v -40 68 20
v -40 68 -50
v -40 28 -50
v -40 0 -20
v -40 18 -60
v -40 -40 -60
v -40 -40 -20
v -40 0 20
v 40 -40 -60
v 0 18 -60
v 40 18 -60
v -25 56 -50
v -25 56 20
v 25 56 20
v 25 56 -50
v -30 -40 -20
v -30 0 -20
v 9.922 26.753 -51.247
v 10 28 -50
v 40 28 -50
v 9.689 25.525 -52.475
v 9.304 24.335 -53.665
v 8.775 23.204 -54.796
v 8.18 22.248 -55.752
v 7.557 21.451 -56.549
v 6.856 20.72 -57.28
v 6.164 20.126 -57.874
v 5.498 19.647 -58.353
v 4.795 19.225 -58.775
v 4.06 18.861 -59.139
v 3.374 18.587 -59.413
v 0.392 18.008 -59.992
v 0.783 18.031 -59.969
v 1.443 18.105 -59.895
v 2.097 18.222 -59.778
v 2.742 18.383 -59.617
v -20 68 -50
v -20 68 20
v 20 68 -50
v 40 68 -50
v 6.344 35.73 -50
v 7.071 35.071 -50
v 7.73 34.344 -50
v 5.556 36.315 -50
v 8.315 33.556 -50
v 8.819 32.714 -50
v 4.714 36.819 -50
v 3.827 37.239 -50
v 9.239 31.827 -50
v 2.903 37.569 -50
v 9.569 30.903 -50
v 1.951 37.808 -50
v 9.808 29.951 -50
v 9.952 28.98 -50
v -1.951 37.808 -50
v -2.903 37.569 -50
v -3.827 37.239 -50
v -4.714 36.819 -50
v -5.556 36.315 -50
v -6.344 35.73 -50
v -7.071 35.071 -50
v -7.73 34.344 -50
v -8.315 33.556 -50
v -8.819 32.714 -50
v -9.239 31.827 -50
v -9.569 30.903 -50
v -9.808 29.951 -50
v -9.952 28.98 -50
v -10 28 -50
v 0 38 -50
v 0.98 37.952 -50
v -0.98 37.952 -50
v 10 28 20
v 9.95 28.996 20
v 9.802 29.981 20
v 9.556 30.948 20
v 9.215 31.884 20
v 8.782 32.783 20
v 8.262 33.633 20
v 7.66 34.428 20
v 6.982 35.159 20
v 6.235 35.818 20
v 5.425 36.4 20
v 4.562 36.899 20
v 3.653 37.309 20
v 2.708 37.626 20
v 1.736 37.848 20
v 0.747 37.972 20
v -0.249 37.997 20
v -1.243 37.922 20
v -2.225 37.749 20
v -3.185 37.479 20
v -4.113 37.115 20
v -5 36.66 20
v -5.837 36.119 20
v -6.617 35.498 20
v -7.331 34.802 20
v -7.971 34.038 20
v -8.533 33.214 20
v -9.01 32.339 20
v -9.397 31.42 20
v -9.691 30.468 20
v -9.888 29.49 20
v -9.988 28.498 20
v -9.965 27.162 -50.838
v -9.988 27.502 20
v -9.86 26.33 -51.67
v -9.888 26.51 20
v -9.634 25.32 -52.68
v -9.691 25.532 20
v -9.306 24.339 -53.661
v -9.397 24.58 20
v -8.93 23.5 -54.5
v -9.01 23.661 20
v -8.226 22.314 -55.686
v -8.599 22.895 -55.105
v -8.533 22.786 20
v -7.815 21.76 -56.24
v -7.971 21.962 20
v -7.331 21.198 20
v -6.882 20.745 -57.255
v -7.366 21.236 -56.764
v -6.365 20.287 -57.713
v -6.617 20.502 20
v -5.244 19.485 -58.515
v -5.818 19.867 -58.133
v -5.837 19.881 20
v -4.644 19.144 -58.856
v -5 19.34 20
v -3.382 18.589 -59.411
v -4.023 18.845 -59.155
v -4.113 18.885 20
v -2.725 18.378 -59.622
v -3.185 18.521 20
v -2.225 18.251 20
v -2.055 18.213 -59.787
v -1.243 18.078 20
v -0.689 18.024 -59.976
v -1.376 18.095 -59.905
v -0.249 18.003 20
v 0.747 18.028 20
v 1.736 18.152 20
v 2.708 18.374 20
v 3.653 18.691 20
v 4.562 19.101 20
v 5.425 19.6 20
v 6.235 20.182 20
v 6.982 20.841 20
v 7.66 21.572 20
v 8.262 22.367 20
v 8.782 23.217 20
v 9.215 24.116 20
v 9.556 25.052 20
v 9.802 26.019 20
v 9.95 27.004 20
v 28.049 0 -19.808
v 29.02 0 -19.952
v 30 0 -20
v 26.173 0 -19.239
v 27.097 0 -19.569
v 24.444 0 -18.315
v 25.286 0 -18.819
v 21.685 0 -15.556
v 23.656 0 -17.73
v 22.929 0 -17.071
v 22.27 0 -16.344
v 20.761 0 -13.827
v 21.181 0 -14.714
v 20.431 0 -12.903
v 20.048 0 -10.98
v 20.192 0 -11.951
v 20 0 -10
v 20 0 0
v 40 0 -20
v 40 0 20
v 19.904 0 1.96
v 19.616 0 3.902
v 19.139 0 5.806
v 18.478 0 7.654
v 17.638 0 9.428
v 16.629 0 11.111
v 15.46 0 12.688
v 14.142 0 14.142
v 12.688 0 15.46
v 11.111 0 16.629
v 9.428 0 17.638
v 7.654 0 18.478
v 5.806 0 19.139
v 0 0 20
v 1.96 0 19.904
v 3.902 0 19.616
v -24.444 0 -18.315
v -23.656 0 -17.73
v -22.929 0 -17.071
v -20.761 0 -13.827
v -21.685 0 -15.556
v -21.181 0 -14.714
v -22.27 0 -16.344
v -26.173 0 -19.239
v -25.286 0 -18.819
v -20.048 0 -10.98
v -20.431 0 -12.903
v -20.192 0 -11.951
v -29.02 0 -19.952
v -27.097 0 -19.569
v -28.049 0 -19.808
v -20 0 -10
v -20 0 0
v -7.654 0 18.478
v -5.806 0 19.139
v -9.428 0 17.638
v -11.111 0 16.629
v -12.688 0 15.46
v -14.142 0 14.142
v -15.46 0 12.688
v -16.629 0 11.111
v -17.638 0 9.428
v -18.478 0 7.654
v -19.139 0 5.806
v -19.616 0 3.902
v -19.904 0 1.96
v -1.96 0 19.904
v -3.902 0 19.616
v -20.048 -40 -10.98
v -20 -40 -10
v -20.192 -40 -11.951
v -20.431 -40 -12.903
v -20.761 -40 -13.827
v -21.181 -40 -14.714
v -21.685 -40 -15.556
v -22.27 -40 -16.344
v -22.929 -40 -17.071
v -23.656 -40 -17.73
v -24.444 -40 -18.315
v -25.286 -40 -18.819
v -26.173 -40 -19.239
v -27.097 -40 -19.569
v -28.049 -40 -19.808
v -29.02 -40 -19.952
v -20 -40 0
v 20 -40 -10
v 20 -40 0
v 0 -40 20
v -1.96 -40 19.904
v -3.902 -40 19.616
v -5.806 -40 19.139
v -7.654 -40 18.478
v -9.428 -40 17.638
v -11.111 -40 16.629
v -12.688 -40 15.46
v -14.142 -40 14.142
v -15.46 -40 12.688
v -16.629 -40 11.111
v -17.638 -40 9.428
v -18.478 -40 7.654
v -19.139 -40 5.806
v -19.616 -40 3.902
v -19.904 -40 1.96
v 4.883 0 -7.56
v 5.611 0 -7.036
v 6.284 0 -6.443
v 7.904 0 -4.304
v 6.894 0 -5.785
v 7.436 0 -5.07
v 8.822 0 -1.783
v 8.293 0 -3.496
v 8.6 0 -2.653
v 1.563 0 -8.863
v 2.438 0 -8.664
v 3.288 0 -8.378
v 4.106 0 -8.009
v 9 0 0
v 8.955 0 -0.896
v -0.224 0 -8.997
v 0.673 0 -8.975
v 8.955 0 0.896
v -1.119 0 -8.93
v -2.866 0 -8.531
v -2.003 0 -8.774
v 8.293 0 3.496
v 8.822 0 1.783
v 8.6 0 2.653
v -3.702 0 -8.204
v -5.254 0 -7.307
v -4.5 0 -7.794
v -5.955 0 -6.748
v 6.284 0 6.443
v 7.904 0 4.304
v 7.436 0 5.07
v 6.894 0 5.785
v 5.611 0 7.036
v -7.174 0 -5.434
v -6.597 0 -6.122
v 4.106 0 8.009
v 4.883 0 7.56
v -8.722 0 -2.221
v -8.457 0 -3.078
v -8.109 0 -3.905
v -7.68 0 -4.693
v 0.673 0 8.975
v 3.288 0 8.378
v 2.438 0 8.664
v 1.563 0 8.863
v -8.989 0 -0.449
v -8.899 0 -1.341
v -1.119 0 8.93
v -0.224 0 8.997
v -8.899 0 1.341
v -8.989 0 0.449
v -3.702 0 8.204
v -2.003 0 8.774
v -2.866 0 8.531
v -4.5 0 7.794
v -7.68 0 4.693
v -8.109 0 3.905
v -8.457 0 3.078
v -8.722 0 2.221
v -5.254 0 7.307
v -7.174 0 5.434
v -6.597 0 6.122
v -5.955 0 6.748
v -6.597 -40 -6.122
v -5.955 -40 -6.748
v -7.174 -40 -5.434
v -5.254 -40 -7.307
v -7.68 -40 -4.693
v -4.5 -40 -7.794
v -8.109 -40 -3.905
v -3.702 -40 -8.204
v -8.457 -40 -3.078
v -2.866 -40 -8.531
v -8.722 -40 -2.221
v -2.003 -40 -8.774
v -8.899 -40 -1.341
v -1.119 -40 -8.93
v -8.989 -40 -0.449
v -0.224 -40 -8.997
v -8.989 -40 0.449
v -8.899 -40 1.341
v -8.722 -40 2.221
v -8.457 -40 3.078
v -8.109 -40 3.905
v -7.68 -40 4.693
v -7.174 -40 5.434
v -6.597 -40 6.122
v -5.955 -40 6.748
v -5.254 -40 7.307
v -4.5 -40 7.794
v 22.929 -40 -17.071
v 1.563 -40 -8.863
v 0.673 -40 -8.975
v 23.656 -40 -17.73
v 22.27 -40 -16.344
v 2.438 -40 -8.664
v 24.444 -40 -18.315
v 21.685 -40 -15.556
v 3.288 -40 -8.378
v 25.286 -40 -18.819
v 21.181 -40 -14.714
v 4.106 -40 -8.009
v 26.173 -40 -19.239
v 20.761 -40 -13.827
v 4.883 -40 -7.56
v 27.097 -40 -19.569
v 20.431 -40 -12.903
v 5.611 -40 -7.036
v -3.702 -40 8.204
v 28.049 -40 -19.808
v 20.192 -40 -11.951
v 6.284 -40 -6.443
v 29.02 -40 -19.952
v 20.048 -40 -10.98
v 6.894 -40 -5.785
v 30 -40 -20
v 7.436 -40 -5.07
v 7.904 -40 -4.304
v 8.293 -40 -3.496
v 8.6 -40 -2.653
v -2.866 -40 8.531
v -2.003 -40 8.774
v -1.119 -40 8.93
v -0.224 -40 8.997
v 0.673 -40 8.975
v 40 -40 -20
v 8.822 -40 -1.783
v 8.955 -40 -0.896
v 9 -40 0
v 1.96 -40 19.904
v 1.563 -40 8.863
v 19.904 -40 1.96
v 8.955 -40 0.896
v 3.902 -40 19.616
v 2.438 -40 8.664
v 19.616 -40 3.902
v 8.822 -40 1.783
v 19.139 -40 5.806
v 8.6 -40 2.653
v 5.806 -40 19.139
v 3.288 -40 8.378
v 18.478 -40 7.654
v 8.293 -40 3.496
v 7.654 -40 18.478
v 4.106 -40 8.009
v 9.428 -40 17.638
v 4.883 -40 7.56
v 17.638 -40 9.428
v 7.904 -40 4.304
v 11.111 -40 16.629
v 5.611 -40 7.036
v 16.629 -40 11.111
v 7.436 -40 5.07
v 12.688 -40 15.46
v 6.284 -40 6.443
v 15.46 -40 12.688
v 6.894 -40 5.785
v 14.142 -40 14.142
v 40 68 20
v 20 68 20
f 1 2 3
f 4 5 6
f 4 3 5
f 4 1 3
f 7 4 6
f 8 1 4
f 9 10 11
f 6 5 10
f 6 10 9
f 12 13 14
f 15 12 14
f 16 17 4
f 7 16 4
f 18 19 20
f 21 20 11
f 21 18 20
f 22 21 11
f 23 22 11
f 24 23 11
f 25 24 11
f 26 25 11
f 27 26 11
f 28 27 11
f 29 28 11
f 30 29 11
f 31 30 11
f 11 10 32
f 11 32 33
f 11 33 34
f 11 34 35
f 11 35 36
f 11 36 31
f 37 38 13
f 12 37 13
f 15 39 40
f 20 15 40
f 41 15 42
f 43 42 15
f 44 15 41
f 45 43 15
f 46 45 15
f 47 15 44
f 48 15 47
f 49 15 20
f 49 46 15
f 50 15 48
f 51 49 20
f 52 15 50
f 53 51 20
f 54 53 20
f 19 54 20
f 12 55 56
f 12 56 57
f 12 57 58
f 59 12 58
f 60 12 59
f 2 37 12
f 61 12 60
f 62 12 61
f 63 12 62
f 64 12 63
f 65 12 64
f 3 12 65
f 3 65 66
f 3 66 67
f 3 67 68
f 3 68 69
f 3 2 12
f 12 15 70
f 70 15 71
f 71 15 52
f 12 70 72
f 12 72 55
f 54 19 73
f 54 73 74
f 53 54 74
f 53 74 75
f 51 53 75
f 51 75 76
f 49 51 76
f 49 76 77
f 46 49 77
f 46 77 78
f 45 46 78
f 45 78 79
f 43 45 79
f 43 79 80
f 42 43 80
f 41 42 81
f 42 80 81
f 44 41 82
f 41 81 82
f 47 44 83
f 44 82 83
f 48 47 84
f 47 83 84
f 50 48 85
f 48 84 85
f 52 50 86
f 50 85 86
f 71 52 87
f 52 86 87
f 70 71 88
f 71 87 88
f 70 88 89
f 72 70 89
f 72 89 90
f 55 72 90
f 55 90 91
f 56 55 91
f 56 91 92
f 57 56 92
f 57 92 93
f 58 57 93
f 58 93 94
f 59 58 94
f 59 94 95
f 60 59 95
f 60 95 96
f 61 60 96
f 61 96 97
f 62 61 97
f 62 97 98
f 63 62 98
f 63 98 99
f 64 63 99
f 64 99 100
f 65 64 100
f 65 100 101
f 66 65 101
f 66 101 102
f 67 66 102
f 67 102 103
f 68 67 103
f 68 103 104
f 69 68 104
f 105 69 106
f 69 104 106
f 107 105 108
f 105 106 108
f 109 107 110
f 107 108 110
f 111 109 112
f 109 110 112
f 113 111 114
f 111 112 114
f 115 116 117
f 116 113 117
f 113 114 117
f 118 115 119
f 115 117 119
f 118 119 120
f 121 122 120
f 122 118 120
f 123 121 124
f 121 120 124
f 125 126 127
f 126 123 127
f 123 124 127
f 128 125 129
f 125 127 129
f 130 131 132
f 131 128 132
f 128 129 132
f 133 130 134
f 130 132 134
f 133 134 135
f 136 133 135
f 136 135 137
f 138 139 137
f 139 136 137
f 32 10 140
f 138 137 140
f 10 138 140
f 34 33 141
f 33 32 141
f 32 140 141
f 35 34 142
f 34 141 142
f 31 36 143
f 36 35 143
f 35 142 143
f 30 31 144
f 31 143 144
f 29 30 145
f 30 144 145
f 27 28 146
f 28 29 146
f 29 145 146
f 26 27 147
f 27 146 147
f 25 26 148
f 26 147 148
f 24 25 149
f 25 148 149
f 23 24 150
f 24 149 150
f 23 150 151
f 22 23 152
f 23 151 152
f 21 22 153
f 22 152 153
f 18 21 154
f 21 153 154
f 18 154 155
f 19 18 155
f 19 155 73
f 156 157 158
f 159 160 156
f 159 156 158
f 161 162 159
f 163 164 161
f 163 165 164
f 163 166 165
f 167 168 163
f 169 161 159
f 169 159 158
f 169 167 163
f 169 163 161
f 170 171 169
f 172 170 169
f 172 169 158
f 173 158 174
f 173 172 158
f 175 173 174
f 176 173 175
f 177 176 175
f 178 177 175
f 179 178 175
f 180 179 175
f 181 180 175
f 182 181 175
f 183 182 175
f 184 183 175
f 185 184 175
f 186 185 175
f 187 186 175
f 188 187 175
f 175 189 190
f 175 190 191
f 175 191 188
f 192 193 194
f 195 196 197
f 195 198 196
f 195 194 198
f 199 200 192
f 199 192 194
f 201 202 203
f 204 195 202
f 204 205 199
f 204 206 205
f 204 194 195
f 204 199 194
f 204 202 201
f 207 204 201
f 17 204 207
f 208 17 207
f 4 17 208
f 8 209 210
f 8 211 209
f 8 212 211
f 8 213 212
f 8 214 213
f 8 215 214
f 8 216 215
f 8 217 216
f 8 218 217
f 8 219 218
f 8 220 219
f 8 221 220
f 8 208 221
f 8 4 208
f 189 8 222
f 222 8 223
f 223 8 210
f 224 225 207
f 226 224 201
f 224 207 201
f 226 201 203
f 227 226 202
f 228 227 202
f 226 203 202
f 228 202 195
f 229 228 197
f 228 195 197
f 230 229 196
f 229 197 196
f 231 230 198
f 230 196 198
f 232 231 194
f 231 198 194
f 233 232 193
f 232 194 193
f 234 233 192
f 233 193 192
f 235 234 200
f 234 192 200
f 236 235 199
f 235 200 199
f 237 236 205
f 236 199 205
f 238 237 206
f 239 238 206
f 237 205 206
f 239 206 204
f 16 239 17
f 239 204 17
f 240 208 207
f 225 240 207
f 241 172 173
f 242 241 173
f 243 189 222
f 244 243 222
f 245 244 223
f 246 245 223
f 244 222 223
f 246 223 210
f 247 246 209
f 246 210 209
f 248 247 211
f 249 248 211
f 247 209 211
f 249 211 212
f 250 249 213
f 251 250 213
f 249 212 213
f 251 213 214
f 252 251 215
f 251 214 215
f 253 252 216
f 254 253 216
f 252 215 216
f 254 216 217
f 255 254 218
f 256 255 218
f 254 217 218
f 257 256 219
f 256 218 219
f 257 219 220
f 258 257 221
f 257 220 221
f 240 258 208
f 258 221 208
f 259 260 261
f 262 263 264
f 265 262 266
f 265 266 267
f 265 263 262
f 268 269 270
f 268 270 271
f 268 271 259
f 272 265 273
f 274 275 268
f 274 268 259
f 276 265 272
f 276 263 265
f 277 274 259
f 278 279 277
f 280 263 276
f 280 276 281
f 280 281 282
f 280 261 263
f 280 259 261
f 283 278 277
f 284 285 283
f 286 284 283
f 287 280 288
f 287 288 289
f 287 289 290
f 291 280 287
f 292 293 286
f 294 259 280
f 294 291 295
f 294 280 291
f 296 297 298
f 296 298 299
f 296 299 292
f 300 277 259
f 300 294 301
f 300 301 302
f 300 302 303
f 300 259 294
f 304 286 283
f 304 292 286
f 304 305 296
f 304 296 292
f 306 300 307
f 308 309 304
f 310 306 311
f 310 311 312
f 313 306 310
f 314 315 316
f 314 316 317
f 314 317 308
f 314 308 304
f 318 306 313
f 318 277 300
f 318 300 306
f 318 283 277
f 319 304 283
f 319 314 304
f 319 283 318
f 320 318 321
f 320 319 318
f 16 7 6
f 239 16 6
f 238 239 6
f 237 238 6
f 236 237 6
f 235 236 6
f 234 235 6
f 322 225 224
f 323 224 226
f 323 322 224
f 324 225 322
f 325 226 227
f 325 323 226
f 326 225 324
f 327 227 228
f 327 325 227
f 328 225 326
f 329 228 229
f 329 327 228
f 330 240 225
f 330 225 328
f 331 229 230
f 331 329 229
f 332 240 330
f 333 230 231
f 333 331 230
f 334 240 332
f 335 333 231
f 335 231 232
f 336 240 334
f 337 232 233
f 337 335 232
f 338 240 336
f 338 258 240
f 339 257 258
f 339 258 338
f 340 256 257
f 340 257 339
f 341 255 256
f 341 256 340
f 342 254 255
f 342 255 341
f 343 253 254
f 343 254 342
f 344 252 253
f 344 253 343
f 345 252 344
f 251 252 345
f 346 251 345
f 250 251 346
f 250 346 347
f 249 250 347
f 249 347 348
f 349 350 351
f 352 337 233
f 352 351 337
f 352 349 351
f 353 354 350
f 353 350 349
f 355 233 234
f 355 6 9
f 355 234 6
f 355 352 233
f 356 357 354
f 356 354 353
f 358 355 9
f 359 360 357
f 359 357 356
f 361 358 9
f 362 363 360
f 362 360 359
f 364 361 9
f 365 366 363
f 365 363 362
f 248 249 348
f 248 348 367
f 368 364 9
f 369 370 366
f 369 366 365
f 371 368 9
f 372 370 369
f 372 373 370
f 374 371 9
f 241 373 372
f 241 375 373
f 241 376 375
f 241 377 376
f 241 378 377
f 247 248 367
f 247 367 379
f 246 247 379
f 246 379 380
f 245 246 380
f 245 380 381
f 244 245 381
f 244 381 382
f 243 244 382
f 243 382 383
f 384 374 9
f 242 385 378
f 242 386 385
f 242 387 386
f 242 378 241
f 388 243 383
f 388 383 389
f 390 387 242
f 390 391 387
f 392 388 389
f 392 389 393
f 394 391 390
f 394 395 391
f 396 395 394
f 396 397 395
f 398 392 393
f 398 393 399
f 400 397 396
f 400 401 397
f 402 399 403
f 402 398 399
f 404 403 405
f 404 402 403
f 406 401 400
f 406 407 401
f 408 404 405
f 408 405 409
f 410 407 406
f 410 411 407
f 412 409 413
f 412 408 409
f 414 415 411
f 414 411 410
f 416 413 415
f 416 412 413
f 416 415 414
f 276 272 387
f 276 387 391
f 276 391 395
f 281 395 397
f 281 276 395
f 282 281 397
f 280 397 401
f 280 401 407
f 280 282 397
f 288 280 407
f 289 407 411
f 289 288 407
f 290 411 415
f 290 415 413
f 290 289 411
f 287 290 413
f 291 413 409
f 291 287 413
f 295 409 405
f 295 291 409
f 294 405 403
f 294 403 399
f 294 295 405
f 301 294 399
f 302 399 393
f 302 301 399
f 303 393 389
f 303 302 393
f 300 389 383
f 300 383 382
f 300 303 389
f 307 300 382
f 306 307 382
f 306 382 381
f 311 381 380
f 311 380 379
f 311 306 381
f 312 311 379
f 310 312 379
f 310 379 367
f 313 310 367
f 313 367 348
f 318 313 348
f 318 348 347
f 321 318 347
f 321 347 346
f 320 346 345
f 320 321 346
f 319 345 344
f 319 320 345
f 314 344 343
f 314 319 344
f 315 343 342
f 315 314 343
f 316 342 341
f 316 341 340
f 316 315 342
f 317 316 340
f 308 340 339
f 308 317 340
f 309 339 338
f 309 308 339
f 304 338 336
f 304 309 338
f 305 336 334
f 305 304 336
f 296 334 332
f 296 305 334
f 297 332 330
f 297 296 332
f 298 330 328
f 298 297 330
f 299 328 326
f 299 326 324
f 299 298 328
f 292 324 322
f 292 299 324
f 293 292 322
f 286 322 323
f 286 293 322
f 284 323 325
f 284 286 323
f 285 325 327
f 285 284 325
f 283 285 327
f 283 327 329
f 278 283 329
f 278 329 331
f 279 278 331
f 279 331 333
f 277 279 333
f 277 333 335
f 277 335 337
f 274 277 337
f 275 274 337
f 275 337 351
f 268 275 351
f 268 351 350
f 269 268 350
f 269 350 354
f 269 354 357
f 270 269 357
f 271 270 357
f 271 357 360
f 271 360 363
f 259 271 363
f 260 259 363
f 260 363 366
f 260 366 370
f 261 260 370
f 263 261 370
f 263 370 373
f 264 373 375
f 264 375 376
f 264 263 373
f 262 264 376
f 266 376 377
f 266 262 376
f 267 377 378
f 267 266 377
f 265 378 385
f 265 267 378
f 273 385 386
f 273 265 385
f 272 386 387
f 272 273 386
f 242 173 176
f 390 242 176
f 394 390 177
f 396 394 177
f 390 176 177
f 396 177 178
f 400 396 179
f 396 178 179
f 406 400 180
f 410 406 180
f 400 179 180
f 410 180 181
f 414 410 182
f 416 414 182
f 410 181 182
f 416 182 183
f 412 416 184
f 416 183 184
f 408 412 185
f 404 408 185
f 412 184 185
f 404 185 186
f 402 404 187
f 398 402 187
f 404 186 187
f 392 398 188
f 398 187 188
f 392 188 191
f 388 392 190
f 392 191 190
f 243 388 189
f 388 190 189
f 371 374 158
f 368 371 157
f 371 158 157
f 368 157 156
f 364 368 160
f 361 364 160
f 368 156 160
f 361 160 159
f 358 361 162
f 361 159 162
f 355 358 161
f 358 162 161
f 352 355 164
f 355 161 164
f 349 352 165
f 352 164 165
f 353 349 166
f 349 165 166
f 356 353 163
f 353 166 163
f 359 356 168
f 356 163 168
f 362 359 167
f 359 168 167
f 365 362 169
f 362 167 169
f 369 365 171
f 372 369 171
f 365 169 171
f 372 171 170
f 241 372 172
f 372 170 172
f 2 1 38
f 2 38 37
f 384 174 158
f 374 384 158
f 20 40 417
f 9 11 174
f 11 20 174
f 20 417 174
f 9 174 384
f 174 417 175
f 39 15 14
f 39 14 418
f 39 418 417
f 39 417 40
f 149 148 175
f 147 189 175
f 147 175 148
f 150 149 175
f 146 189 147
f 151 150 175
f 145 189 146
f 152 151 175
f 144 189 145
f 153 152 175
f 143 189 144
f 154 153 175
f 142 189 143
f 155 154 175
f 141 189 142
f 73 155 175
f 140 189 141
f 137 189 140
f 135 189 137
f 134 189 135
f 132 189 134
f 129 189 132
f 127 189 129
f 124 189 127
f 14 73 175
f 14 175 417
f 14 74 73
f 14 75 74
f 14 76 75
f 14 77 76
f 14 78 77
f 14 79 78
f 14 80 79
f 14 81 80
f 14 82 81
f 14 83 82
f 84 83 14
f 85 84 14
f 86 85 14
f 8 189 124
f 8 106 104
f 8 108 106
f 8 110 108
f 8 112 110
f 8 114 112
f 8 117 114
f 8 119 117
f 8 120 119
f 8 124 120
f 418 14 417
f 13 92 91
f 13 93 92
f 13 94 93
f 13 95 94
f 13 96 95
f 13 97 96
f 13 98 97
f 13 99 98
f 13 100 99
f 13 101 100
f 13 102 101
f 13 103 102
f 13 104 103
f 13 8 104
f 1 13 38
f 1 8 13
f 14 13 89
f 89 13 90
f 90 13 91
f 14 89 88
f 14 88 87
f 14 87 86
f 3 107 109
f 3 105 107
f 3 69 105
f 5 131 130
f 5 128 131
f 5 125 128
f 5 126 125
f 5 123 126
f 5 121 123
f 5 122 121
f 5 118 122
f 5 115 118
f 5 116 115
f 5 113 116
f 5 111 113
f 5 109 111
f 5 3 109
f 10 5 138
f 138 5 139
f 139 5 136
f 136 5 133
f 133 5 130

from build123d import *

# Parameters (mm, degrees)
F0_R     = 9
F1_DEPTH = 40
F3_DEPTH = 80
F5_DEPTH = 100
F7_R     = 10
F8_DEPTH = 100


with BuildPart() as f1:
    # F0 (on Front) → F1 (new body)
    with BuildSketch(Plane.XZ):
        with BuildLine():
            ThreePointArc((-20, 0), (0, -20), (20, 0))
            ThreePointArc((20, 0), (14.1421356237, 14.1421356237), (0, 20))
            ThreePointArc((0, 20), (-14.1421356237, 14.1421356237), (-20, 0))
        make_face()
        Circle(F0_R, mode=Mode.SUBTRACT)
        with BuildLine():
            Line((20, -10), (20, 0))
            ThreePointArc((20, 0), (0, -20), (-20, 0))
            Line((-20, 0), (-20, -10))
            ThreePointArc((-20, -10), (-22.9289321881, -17.0710678119), (-30, -20))
            Line((-30, -20), (-40, -20))
            Line((-40, -20), (-40, -60))
            Line((-40, -60), (40, -60))
            Line((40, -60), (40, -20))
            Line((40, -20), (30, -20))
            ThreePointArc((30, -20), (22.9289321881, -17.0710678119), (20, -10))
        make_face()
    extrude(amount=F1_DEPTH)

    # F2 (on face) → F3 (join)
    with BuildSketch(Plane(origin=(-40, 0, 0), x_dir=(0, -1, 0), z_dir=(-1, 0, 0))):
        Polygon((-18, -60), (0, -60), (0, -20), (0, 20), (-68, 20), (-68, -50), (-28, -50), align=None)
    extrude(amount=-F3_DEPTH)


with BuildPart() as f5:
    # F4 (on face) → F5 (new body)
    with BuildSketch(Plane.XY.offset(20)):
        Polygon((20, 68), (-20, 68), (-25, 56), (0, 56), (25, 56), align=None)
    extrude(amount=-F5_DEPTH)


with BuildPart() as f1_1:
    add(f1.part)

    # F6: cut F5
    add(f5.part, mode=Mode.SUBTRACT)


with BuildPart() as f8:
    # F7 (on face) → F8 (new body)
    with BuildSketch(Plane.XY.offset(20)):
        with Locations((0, 28)):
            Circle(F7_R)
    extrude(amount=-F8_DEPTH)


with BuildPart() as f1_2:
    add(f1_1.part)

    # F9: cut F8
    add(f8.part, mode=Mode.SUBTRACT)


solid = f1_2.part
